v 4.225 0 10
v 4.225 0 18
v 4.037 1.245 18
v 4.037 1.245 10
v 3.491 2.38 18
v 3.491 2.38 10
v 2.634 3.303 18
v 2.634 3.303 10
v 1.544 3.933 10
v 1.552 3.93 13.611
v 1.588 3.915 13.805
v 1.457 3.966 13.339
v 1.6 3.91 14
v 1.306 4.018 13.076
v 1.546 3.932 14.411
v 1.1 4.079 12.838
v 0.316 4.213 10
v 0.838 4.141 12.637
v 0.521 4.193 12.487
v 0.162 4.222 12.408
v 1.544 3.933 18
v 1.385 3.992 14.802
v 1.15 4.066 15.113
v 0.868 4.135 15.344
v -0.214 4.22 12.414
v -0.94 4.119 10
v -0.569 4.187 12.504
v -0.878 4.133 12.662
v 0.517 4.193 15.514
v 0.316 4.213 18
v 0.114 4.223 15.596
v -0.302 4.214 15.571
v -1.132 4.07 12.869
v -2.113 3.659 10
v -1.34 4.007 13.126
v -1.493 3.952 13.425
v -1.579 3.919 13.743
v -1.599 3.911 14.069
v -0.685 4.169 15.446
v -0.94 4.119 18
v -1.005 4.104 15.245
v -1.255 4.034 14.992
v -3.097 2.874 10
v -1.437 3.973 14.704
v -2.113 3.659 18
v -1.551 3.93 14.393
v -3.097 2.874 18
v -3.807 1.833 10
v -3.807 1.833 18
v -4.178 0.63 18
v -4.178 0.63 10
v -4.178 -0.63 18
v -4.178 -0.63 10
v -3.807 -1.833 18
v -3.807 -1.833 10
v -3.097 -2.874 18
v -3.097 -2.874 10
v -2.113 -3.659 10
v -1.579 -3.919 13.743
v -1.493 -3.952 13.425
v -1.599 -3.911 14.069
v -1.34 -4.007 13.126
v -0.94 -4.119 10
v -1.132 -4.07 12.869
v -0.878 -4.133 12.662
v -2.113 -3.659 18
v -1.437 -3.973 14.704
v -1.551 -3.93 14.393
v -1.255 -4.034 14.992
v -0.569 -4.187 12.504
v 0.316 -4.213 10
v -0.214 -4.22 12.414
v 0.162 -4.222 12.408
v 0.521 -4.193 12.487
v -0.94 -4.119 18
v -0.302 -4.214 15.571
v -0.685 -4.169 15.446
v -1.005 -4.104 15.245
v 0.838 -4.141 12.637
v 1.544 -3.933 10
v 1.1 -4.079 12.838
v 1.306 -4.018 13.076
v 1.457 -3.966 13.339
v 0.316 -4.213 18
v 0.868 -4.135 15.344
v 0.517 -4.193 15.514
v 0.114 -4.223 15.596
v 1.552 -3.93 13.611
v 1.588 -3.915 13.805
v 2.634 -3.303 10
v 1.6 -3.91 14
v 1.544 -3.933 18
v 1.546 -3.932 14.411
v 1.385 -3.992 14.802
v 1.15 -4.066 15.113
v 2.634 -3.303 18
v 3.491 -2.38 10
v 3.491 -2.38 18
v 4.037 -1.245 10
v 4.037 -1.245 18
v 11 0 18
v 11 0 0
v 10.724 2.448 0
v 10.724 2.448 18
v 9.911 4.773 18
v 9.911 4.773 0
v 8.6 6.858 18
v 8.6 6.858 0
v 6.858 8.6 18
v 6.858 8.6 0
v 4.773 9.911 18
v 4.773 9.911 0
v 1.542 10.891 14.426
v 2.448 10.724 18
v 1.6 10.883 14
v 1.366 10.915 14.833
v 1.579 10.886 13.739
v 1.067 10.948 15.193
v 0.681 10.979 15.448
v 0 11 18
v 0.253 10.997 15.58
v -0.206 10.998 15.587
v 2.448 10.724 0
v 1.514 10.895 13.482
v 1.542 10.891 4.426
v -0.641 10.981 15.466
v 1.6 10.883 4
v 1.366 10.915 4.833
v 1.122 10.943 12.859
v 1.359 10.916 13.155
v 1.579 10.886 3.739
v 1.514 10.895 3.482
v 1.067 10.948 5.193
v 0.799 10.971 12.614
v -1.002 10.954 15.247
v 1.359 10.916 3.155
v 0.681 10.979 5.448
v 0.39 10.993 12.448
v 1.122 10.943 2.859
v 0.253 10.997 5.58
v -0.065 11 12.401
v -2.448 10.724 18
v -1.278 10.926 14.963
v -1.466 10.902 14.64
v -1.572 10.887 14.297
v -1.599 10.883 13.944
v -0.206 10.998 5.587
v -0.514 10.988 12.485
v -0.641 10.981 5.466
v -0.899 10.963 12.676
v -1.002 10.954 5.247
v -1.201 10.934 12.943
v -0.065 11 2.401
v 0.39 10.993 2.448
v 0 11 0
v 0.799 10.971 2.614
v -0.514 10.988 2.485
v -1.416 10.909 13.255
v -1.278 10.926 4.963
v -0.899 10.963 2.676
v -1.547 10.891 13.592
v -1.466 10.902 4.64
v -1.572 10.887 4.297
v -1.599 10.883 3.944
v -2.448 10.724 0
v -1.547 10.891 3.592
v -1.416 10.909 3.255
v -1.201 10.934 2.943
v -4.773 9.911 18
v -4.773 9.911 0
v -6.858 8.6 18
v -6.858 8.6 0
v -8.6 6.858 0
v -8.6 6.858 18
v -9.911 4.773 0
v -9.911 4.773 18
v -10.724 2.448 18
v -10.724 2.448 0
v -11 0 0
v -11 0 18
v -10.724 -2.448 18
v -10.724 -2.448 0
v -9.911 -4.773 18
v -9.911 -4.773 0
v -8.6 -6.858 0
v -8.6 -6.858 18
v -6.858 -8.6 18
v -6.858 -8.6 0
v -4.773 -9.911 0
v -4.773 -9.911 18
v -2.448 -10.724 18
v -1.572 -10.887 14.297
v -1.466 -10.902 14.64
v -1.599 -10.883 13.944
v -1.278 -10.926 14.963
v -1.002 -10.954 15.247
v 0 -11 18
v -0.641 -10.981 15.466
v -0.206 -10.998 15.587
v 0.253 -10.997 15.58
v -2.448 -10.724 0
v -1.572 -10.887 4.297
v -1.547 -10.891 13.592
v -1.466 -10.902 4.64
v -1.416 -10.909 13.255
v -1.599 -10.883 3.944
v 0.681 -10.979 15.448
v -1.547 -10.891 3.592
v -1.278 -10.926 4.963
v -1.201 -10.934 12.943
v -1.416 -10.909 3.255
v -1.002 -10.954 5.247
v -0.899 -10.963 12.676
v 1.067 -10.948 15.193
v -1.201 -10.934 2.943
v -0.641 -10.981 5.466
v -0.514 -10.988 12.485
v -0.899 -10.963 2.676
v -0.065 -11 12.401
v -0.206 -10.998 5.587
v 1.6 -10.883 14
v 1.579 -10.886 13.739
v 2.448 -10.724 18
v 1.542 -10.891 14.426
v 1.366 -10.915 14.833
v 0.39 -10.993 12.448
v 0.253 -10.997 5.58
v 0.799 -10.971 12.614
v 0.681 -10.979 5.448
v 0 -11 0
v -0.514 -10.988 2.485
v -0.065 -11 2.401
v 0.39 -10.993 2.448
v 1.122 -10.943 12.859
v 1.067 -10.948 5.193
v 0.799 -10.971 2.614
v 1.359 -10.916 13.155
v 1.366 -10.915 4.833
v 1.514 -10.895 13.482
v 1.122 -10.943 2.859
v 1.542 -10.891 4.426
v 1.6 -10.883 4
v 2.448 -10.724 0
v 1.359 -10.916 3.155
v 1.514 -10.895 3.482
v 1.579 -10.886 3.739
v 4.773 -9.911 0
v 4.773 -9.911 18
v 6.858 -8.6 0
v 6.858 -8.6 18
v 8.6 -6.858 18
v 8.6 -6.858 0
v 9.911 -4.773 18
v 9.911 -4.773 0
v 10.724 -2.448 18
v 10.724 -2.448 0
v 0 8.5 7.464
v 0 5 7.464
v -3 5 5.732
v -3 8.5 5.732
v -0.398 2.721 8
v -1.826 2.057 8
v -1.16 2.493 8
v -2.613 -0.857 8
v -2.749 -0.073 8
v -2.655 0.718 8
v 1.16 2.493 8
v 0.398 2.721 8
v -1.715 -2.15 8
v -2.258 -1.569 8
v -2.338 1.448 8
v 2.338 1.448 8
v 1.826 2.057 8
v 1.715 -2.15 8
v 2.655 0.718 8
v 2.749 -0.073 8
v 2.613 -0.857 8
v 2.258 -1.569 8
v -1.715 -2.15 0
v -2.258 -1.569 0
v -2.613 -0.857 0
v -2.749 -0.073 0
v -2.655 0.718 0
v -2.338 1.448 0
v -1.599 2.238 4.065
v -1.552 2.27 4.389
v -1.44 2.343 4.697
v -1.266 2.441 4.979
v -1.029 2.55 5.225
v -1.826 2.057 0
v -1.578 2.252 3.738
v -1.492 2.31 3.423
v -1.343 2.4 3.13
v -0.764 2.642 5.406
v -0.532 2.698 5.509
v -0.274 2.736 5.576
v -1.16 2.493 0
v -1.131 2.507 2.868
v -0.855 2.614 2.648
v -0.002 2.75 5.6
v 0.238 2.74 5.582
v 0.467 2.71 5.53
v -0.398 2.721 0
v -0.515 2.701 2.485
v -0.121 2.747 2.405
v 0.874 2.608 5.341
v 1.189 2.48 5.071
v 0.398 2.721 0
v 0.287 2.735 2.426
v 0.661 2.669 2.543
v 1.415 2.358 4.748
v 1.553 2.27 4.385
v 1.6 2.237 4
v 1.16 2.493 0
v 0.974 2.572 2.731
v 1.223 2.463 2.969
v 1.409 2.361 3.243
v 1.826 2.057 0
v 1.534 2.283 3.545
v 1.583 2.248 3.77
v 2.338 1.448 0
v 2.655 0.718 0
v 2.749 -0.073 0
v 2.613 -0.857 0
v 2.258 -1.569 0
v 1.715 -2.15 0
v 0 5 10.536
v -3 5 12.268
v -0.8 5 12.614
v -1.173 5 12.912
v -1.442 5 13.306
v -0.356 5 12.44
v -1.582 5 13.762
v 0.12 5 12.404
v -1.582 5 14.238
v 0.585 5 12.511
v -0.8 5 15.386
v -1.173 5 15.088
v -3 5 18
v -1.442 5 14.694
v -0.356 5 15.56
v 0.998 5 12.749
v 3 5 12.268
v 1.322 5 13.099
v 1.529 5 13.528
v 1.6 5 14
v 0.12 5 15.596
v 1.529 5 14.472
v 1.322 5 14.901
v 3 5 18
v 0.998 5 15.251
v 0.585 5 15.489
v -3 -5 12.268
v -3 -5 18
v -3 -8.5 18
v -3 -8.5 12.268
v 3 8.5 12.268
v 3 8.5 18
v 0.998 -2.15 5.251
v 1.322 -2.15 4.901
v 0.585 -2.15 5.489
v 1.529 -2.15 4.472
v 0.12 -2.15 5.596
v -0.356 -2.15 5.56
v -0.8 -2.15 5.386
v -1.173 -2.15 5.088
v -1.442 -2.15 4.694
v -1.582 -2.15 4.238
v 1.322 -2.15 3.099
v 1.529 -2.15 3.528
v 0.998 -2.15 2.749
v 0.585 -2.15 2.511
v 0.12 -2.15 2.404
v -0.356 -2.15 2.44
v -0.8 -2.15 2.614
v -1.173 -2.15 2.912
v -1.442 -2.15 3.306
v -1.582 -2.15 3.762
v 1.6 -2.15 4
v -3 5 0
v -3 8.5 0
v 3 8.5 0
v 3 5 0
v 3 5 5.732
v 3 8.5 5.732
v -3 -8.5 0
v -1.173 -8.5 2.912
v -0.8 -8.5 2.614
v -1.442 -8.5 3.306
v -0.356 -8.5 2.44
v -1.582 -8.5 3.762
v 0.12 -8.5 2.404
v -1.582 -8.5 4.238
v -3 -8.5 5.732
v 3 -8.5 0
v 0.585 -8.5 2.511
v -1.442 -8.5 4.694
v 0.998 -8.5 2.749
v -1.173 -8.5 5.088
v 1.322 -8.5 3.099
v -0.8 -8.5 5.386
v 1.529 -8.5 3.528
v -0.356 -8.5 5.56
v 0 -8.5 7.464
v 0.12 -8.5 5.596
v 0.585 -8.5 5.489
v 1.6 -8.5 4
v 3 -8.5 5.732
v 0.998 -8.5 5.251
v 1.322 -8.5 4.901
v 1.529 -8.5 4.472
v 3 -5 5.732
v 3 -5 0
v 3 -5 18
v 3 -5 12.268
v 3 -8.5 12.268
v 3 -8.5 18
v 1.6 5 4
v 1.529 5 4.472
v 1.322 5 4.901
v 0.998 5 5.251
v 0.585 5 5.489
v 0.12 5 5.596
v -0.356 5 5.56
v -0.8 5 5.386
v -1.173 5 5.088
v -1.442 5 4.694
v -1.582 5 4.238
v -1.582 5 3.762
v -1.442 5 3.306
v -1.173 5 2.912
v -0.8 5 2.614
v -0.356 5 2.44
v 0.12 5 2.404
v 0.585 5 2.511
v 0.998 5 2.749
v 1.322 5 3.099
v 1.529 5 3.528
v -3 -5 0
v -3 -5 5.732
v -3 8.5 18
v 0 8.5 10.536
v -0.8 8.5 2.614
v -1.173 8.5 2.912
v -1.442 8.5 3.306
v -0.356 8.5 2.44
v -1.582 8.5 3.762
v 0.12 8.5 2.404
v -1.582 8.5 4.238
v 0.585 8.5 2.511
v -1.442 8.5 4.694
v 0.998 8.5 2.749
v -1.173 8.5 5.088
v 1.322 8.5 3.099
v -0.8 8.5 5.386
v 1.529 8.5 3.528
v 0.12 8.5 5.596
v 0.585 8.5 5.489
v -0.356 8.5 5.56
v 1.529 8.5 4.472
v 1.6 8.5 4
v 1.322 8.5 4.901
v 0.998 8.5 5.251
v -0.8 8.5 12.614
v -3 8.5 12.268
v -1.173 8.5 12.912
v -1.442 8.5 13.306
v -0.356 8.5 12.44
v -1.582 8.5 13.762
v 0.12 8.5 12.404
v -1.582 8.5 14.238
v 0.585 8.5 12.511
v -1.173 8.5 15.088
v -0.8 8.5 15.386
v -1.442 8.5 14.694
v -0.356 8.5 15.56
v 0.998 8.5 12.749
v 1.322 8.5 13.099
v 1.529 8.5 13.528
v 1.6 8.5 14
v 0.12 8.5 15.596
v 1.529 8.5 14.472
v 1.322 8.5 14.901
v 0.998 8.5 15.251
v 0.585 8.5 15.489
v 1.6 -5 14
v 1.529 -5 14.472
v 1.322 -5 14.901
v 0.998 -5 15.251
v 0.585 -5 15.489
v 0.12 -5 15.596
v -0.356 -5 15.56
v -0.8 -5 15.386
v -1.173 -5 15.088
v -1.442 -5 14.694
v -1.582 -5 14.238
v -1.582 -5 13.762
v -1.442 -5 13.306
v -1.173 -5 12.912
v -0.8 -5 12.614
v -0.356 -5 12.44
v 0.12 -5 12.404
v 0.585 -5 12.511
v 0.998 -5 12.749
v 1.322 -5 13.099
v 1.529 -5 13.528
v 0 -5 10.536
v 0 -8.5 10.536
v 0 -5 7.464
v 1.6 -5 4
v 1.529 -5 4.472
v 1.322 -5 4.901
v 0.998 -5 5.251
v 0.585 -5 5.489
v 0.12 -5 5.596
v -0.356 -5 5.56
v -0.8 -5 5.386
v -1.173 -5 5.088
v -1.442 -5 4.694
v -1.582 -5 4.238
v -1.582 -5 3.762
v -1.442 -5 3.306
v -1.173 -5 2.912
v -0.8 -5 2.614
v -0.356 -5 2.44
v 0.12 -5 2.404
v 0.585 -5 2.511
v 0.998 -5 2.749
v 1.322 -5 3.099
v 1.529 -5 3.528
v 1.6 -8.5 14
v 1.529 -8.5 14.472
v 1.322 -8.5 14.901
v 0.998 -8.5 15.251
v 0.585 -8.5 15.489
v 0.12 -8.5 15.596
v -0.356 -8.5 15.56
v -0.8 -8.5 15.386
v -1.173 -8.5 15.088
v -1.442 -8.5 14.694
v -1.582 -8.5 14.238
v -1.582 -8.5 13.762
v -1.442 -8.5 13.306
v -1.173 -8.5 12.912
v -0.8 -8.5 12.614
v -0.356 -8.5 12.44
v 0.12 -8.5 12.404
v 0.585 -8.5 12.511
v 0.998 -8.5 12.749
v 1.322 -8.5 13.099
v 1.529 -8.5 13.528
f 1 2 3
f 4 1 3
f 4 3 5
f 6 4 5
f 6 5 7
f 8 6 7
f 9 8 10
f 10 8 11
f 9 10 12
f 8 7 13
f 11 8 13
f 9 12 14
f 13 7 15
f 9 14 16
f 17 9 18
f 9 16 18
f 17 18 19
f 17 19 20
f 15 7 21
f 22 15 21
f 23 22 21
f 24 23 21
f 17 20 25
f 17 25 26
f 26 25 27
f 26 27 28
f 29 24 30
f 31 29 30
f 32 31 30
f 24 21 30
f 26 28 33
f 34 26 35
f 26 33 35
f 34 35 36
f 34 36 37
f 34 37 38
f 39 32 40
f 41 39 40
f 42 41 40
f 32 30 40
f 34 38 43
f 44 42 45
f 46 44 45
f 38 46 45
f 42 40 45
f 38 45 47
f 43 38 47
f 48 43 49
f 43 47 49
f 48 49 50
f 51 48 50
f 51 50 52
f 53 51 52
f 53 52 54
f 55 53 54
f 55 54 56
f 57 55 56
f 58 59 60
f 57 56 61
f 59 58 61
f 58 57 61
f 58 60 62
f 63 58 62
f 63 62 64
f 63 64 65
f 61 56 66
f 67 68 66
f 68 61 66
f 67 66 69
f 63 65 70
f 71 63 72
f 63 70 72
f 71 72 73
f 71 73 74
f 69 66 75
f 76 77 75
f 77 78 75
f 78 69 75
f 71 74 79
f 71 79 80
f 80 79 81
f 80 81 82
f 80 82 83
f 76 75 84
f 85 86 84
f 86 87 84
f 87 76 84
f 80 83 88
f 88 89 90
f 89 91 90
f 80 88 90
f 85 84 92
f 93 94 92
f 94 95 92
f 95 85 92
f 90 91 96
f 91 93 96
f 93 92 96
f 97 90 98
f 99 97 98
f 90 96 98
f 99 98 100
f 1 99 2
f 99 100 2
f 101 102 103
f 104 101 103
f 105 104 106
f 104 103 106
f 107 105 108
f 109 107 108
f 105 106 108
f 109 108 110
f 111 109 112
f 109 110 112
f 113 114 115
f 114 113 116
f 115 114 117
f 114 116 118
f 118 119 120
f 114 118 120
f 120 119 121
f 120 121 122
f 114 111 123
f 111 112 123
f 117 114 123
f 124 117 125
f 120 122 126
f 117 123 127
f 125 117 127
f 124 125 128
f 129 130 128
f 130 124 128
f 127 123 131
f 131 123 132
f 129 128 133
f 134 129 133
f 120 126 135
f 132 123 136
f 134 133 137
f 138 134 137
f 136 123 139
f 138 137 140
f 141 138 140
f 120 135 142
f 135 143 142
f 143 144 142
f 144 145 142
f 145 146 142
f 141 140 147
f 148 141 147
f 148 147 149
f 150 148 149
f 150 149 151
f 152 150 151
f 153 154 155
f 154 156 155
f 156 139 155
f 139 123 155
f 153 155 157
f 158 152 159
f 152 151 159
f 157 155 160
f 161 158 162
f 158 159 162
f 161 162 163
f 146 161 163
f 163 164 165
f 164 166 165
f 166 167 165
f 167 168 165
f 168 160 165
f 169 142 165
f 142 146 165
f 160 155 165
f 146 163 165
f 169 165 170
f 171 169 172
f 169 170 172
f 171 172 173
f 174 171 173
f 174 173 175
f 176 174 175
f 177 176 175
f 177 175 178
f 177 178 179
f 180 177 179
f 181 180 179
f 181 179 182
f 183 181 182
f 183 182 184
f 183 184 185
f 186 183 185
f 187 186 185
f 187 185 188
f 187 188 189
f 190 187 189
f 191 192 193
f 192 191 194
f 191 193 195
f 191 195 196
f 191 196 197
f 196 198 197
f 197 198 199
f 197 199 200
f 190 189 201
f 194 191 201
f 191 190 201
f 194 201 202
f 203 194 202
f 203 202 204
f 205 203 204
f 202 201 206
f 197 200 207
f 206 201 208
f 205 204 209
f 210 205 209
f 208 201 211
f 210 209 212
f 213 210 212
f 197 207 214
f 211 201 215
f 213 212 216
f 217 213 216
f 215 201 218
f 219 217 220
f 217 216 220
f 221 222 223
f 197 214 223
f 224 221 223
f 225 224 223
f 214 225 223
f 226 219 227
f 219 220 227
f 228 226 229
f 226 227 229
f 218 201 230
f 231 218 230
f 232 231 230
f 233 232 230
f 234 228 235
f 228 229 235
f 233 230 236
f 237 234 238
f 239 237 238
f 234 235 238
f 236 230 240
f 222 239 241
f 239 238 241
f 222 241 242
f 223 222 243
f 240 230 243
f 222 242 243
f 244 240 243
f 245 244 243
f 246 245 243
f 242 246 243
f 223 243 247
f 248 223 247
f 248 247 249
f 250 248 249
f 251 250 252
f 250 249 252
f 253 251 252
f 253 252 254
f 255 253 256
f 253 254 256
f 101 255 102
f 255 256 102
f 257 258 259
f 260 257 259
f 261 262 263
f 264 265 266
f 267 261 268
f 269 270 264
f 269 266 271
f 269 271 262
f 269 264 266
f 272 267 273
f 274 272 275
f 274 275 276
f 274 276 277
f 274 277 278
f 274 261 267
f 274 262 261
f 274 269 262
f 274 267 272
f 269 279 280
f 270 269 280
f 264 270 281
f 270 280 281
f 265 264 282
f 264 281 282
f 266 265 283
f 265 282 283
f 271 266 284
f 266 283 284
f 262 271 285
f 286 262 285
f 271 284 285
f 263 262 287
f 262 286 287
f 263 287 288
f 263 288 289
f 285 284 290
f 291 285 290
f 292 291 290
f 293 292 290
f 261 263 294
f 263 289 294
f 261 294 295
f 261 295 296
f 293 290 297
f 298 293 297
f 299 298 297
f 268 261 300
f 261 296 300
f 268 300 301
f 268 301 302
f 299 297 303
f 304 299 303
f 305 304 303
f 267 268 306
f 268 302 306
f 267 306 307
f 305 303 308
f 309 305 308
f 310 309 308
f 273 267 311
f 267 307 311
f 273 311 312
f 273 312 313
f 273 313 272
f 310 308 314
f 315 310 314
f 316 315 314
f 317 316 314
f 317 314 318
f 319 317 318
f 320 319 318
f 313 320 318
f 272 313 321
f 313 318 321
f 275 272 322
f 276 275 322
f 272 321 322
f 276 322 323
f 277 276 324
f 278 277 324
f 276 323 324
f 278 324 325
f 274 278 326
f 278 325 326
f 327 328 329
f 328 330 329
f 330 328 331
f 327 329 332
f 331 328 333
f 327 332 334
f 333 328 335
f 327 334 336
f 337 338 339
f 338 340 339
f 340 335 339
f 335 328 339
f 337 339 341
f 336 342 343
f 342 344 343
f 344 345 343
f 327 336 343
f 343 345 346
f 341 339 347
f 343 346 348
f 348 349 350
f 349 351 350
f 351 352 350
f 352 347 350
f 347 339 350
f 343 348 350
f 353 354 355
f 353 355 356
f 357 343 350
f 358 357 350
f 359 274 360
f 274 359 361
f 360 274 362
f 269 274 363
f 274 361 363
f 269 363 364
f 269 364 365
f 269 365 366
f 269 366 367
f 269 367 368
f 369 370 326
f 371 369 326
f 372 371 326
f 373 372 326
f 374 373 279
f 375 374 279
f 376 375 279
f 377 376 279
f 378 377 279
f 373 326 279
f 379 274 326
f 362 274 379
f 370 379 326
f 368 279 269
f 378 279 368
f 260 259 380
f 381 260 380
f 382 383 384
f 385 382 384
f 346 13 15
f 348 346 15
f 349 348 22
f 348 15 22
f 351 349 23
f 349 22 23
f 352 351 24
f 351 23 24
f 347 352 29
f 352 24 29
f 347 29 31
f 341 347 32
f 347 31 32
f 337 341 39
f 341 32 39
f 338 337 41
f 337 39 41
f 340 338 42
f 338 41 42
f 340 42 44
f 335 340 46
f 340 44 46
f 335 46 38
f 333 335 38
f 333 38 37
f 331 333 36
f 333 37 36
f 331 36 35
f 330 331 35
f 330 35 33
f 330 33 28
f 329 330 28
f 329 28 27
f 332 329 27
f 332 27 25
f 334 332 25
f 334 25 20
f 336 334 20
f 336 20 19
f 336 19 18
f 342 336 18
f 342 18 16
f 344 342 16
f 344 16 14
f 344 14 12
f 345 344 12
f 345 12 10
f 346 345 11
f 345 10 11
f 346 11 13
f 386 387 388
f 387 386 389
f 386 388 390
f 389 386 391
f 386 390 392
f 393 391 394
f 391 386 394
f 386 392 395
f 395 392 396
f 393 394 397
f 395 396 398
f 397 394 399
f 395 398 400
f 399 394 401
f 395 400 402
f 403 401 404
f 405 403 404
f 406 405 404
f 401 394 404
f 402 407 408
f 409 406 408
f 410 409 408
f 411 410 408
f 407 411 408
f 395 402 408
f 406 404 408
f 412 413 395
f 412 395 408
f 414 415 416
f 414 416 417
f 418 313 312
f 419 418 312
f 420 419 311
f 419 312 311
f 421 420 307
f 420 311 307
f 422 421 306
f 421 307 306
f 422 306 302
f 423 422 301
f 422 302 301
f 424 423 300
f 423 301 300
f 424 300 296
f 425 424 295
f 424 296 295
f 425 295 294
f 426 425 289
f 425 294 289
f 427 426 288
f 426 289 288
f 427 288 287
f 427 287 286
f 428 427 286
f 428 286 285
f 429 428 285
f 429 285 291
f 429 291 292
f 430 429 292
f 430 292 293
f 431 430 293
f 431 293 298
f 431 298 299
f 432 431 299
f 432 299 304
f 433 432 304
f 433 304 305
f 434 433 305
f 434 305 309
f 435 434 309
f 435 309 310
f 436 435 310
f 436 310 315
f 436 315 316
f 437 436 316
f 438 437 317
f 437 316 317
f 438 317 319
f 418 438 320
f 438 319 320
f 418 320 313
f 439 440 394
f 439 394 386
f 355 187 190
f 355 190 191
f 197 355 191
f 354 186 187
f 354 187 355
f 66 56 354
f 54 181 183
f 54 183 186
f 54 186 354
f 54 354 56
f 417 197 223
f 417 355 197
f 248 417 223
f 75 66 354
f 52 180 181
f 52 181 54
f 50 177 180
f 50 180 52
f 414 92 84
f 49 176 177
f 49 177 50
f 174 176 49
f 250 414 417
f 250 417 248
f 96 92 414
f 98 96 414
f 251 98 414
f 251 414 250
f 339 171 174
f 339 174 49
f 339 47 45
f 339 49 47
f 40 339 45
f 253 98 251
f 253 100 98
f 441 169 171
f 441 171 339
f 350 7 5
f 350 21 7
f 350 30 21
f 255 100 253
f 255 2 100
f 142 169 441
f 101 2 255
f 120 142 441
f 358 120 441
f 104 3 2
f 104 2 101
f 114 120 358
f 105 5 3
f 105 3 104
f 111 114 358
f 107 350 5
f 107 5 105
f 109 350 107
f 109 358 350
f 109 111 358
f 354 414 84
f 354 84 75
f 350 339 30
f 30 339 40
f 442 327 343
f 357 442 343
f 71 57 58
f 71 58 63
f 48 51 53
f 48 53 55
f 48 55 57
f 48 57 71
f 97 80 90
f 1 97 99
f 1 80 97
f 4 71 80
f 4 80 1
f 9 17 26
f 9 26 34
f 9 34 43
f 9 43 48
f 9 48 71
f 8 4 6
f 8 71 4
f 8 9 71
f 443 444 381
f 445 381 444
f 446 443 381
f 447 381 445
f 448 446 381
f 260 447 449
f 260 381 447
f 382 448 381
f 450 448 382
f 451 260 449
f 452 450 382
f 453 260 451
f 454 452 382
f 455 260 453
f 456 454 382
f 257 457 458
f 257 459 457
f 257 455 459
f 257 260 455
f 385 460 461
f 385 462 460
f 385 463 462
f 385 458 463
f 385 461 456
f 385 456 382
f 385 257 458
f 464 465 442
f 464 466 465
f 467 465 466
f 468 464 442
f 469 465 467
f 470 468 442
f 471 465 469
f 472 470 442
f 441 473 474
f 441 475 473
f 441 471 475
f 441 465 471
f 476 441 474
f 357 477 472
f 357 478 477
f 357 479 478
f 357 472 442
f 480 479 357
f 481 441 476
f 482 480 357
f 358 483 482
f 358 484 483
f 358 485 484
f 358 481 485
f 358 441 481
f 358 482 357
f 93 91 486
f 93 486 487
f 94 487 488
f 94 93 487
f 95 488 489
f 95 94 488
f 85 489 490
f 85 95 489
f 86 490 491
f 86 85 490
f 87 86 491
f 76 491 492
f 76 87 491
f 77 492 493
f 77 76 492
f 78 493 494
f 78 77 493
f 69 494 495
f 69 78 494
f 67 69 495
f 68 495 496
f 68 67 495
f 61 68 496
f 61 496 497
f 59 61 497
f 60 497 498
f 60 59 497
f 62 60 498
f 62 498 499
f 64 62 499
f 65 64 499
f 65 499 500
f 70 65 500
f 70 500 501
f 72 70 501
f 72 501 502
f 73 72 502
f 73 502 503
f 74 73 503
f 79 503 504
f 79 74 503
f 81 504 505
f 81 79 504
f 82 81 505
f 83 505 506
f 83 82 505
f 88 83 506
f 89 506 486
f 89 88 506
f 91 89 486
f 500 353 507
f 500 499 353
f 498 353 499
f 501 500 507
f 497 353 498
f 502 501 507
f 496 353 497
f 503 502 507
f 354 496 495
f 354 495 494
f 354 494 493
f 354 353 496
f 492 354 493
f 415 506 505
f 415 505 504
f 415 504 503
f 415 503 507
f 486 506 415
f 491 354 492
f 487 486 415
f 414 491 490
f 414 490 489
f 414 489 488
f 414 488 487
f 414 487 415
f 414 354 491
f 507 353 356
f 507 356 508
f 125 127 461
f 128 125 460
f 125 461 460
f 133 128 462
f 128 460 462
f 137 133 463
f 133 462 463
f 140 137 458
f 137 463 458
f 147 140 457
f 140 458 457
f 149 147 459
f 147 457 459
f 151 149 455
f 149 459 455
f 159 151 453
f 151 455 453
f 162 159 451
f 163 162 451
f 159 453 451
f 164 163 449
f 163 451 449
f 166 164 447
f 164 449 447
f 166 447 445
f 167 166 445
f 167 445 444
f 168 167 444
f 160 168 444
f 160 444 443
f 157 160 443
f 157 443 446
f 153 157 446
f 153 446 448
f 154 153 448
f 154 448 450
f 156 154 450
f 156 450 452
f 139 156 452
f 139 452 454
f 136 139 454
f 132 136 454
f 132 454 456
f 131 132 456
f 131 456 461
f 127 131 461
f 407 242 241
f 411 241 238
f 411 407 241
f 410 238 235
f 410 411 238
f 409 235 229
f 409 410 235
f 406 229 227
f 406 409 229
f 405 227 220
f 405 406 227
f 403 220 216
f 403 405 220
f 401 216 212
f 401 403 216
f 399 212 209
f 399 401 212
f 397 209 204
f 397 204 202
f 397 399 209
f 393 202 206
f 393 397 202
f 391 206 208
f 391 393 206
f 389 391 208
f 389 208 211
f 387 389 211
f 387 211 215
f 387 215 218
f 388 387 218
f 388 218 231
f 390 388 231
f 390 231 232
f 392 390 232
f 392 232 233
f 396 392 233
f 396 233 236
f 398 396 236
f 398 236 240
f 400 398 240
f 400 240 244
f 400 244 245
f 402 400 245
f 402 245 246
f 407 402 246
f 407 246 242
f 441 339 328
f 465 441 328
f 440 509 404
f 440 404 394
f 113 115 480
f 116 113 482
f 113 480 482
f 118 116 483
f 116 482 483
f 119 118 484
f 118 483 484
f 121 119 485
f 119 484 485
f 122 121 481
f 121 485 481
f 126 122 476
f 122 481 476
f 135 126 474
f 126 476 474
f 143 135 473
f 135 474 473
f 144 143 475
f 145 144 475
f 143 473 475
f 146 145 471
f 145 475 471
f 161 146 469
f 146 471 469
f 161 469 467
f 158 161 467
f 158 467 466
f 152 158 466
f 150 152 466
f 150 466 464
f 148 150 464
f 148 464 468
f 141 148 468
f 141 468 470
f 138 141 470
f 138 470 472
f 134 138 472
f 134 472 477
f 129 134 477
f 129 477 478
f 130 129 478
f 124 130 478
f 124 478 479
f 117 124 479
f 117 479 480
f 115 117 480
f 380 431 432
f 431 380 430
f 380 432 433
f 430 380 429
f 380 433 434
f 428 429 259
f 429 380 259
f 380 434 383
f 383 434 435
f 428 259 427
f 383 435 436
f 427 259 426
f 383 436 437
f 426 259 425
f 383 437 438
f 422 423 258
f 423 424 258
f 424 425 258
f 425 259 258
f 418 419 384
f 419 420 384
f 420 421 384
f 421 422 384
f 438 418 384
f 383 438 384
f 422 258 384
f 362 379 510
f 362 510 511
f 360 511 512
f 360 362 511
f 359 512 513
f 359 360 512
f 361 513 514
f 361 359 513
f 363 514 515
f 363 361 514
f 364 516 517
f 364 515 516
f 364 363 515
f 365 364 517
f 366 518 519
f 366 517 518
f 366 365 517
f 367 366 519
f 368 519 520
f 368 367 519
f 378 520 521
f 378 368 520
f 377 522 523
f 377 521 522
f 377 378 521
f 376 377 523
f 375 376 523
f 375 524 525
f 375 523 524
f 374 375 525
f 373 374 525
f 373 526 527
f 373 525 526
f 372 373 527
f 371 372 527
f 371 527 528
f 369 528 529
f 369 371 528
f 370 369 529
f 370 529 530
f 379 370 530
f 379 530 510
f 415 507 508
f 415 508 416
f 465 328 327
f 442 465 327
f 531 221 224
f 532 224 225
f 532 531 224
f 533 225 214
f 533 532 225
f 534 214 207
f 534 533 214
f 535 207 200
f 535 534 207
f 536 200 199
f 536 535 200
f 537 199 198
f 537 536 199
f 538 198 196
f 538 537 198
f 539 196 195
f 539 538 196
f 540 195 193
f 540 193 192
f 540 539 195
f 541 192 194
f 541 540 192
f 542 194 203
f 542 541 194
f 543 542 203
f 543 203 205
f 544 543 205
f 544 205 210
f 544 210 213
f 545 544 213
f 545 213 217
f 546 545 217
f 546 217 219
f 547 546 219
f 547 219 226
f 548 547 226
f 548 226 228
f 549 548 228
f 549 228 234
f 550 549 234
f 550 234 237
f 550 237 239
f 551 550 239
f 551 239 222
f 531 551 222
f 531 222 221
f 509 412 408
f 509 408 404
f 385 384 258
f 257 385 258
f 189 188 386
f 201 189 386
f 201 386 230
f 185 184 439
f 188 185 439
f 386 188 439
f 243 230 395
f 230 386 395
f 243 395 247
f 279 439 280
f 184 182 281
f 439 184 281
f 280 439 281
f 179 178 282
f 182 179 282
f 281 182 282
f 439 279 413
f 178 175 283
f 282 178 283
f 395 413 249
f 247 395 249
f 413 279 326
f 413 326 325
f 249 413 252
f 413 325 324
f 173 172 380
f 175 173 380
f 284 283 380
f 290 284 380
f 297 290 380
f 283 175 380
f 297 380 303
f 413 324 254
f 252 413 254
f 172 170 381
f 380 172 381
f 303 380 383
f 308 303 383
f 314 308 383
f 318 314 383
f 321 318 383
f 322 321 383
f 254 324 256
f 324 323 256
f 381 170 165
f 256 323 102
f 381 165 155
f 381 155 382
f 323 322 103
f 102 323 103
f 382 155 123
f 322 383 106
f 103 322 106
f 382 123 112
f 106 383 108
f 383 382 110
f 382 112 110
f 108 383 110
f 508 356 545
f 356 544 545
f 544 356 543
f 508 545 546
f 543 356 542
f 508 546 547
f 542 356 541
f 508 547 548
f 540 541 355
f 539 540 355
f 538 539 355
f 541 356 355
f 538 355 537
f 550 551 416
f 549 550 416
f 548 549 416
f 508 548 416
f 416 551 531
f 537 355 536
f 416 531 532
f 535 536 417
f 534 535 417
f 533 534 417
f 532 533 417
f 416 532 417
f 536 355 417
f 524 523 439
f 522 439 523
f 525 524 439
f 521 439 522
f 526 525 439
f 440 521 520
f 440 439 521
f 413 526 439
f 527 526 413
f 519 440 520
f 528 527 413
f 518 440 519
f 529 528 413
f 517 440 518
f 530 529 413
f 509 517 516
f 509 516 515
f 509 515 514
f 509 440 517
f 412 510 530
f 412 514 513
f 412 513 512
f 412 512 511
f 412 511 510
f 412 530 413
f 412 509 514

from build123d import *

# Parameters (mm, degrees)
F0_R          = 11
F1_DEPTH      = 18
F3_DEPTH      = 8
F4_R          = 4.225
F5_DEPTH      = 8
F6_R          = 1.6
F7_DEPTH      = 25
F7_DEPTH_BACK = 25
F9_START      = 5
F9_DEPTH      = 3.5
F10_START     = -5
F10_DEPTH     = 3.5


with BuildPart() as f1:
    # F0 (on Top) → F1 (new body)
    with BuildSketch(Plane.XY):
        Circle(F0_R)
    extrude(amount=F1_DEPTH)

    # F2 (on face) → F3 (cut)
    with BuildSketch(Plane(origin=(0, 0, 0), x_dir=(1, 0, 0), z_dir=(0, 0, -1))):
        with BuildLine():
            Line((1.7146428199, 2.15), (-1.7146428199, 2.15))
            ThreePointArc((-1.7146428199, 2.15), (0, -2.75), (1.7146428199, 2.15))
        make_face()
    extrude(amount=-F3_DEPTH, mode=Mode.SUBTRACT)

    # F4 (on face) + F0 (on Top) → F5 (cut)
    with BuildSketch(Plane.XY.offset(18)):
        Circle(F4_R)
    with BuildSketch(Plane.XY):
        Circle(F0_R)
    extrude(amount=-F5_DEPTH, mode=Mode.SUBTRACT)

    # F6 (on Front) → F7 (cut, two sides)
    with BuildSketch(Plane.XZ) as f7_sk:
        with Locations((0, 4)):
            Circle(F6_R)
        with Locations((0, 14)):
            Circle(F6_R)
    extrude(amount=F7_DEPTH, mode=Mode.SUBTRACT)
    extrude(f7_sk.sketch, amount=-F7_DEPTH_BACK, mode=Mode.SUBTRACT)

    # F8 (on Front) → F9 (cut)
    with BuildSketch(Plane.XZ.offset(F9_START)):
        Polygon((-3, 5.7320508076), (-3, 2.2679491924), (-3, -7.7320508076), (3, -7.7320508076), (3, 2.2679491924), (3, 5.7320508076), (0, 7.4641016151), align=None)
        Polygon((-3, 15.7320508076), (-3, 12.2679491924), (0, 10.5358983849), (3, 12.2679491924), (3, 15.7320508076), (3, 25.7320508076), (-3, 25.7320508076), align=None)
    extrude(amount=F9_DEPTH, mode=Mode.SUBTRACT)

    # F8 (on Front) → F10 (cut)
    with BuildSketch(Plane.XZ.offset(F10_START)):
        Polygon((-3, 5.7320508076), (-3, 2.2679491924), (-3, -7.7320508076), (3, -7.7320508076), (3, 2.2679491924), (3, 5.7320508076), (0, 7.4641016151), align=None)
        Polygon((-3, 15.7320508076), (-3, 12.2679491924), (0, 10.5358983849), (3, 12.2679491924), (3, 15.7320508076), (3, 25.7320508076), (-3, 25.7320508076), align=None)
    extrude(amount=-F10_DEPTH, mode=Mode.SUBTRACT)


solid = f1.part
